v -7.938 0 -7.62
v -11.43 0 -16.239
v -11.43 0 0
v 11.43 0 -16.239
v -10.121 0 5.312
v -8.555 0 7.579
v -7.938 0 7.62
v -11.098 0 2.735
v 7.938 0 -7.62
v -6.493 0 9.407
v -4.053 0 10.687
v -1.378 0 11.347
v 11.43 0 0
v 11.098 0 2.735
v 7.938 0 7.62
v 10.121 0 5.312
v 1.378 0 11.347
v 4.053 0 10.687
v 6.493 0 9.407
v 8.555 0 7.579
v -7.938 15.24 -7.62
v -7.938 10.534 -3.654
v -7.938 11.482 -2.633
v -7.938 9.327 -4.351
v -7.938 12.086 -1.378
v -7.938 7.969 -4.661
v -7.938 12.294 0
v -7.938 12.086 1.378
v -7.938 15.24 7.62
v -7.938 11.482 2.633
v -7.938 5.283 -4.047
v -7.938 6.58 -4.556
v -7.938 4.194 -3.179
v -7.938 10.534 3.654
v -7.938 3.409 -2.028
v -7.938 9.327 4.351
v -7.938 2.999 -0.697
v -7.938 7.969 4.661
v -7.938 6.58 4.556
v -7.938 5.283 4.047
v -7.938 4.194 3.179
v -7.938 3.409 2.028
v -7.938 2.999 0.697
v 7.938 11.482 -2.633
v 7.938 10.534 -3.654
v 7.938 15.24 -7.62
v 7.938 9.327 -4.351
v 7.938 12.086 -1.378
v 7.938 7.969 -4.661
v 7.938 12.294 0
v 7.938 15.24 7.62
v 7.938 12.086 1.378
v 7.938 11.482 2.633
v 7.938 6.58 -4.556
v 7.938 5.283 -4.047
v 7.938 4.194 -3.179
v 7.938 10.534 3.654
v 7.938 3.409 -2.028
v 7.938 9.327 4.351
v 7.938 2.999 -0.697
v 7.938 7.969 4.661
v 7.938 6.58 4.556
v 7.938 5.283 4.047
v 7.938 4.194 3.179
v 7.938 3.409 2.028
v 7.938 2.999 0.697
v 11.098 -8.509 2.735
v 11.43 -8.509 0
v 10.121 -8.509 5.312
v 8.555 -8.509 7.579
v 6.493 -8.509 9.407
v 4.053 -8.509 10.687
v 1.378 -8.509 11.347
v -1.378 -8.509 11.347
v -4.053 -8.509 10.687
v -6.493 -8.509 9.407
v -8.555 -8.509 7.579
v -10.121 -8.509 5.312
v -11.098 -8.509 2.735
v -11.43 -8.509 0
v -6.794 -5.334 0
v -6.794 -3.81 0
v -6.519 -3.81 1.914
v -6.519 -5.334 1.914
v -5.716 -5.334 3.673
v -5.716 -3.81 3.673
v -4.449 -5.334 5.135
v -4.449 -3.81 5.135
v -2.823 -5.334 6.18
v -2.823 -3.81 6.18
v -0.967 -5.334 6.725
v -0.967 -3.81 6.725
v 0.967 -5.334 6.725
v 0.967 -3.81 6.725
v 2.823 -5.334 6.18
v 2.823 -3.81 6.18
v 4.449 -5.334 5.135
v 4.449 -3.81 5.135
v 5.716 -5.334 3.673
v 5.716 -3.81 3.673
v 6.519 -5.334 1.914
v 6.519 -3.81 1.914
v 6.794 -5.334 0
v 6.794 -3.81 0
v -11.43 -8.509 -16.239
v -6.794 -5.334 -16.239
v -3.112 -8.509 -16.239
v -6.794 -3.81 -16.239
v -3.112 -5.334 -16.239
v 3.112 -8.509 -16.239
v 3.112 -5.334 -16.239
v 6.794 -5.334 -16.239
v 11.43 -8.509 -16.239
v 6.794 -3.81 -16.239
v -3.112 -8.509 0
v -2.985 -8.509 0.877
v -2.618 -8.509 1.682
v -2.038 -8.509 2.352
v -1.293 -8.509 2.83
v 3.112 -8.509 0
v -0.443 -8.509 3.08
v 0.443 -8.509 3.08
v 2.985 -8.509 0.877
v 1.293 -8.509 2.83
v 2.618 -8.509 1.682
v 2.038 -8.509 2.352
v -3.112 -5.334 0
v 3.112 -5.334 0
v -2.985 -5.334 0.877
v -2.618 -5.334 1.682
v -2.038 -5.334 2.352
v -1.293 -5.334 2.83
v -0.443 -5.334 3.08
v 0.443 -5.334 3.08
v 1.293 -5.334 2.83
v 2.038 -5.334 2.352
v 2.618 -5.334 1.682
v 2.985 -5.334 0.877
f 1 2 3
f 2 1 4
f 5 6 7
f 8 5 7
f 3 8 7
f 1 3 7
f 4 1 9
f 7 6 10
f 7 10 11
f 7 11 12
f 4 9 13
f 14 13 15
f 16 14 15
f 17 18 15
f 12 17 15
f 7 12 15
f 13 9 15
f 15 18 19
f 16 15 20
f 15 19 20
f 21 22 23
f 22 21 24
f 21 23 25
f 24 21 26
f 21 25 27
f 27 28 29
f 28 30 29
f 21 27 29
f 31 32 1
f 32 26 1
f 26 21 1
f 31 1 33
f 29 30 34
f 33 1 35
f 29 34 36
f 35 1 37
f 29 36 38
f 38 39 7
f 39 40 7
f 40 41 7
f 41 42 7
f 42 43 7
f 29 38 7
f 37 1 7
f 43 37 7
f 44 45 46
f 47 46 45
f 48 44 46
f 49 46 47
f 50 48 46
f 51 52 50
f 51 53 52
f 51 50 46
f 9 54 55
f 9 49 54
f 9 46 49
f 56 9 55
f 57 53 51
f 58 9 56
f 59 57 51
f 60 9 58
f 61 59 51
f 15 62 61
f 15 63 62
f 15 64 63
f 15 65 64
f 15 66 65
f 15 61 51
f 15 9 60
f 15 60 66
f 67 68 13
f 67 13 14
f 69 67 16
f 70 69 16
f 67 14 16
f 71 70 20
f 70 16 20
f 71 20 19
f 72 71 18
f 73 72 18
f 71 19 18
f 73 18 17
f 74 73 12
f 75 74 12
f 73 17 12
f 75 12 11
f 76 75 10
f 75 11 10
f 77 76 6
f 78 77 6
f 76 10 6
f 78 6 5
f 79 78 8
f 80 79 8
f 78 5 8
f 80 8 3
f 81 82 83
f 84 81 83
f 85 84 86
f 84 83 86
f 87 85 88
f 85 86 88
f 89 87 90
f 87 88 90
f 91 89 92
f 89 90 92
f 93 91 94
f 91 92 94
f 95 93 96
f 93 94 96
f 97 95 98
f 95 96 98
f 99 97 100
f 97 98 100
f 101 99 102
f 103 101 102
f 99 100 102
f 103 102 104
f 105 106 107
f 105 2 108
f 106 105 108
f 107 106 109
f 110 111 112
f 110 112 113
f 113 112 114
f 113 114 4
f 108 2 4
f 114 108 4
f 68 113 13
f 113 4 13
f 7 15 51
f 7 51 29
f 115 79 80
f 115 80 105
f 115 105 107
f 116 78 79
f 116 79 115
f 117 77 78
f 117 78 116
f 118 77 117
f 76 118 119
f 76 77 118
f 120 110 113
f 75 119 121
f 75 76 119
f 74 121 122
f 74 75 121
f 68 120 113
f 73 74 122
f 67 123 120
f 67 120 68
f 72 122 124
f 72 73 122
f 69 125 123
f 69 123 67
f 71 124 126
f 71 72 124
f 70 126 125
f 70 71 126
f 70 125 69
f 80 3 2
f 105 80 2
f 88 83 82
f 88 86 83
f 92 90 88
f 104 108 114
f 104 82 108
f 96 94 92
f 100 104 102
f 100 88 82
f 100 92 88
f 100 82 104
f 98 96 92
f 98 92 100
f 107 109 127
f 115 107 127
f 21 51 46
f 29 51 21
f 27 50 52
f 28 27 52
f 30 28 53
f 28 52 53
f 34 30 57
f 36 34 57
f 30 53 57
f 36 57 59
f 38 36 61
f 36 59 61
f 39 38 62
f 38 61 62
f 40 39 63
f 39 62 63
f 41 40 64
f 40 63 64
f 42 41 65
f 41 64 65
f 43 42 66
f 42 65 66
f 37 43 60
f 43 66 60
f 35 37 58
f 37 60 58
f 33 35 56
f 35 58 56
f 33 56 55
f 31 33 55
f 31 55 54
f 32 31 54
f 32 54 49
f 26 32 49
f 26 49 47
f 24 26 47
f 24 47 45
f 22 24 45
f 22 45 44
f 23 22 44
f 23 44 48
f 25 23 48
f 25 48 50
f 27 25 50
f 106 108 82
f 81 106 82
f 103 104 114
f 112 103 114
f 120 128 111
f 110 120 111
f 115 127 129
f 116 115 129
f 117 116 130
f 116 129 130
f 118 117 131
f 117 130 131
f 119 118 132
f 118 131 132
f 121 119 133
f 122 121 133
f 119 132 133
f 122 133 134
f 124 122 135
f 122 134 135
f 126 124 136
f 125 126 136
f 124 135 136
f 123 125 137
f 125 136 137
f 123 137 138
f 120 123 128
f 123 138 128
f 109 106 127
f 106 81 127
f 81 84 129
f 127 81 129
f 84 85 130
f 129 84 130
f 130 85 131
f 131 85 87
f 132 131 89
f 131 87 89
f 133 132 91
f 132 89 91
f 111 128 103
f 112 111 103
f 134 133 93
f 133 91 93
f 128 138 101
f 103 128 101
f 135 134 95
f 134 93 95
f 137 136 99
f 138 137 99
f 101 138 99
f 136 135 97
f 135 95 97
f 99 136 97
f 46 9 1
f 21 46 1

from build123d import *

# Parameters (mm, degrees)
F1_DEPTH = 3.81
F3_DEPTH = 1.524
F5_DEPTH = 3.175
F6_W     = 15.875
F6_H     = 15.24
F7_DEPTH = 15.24
F8_R     = 4.6736
F9_DEPTH = 19.3685


with BuildPart() as f1:
    # F0 (on Front) → F1 (new body)
    with BuildSketch(Plane.XZ):
        with BuildLine():
            Line((-11.43, 0), (11.43, 0))
            ThreePointArc((11.43, 0), (0, 11.43), (-11.43, 0))
        make_face()
        with BuildLine():
            Line((11.43, -16.2387751043), (11.43, 0))
            ThreePointArc((11.43, 0), (0, -11.43), (-11.43, 0))
            Line((-11.43, 0), (-11.43, -16.2387751043))
            Line((-11.43, -16.2387751043), (11.43, -16.2387751043))
        make_face()
        with BuildLine():
            ThreePointArc((-11.43, 0), (0, -11.43), (11.43, 0))
            Line((11.43, 0), (-11.43, 0))
        make_face()
    extrude(amount=F1_DEPTH)

    # F2 (on face) → F3 (join)
    with BuildSketch(Plane.XZ.offset(3.81)):
        with BuildLine():
            Line((11.43, -16.2387751043), (11.43, 0))
            ThreePointArc((11.43, 0), (0, 11.43), (-11.43, 0))
            Line((-11.43, 0), (-11.43, -16.2387751043))
            Line((-11.43, -16.2387751043), (-6.7945, -16.2387751043))
            Line((-6.7945, -16.2387751043), (-6.7945, -11.6032751043))
            Line((-6.7945, -11.6032751043), (-6.7945, 0))
            ThreePointArc((-6.7945, 0), (0, 6.7945), (6.7945, 0))
            Line((6.7945, 0), (6.7945, -11.6032751043))
            Line((6.7945, -11.6032751043), (6.7945, -16.2387751043))
            Line((6.7945, -16.2387751043), (11.43, -16.2387751043))
        make_face()
    extrude(amount=F3_DEPTH)

    # F4 (on face) → F5 (join)
    with BuildSketch(Plane.XZ.offset(5.334)):
        with BuildLine():
            Line((-3.1115, -16.2387751043), (-3.1115, 0))
            ThreePointArc((-3.1115, 0), (0, 3.1115), (3.1115, 0))
            Line((3.1115, 0), (3.1115, -16.2387751043))
            Line((3.1115, -16.2387751043), (11.43, -16.2387751043))
            Line((11.43, -16.2387751043), (11.43, 0))
            ThreePointArc((11.43, 0), (0, 11.43), (-11.43, 0))
            Line((-11.43, 0), (-11.43, -16.2387751043))
            Line((-11.43, -16.2387751043), (-3.1115, -16.2387751043))
        make_face()
    extrude(amount=F5_DEPTH)

    # F6 (on face) → F7 (join)
    with BuildSketch(Plane(origin=(0, 0, 0), x_dir=(-1, 0, 0), z_dir=(0, 1, 0))):
        Rectangle(F6_W, F6_H)
    extrude(amount=F7_DEPTH)

    # F8 (on face) → F9 (cut, through all)
    with BuildSketch(Plane.YZ.offset(7.9375)):
        with Locations((7.62, 0)):
            Circle(F8_R)
    extrude(amount=-F9_DEPTH, mode=Mode.SUBTRACT)


solid = f1.part
